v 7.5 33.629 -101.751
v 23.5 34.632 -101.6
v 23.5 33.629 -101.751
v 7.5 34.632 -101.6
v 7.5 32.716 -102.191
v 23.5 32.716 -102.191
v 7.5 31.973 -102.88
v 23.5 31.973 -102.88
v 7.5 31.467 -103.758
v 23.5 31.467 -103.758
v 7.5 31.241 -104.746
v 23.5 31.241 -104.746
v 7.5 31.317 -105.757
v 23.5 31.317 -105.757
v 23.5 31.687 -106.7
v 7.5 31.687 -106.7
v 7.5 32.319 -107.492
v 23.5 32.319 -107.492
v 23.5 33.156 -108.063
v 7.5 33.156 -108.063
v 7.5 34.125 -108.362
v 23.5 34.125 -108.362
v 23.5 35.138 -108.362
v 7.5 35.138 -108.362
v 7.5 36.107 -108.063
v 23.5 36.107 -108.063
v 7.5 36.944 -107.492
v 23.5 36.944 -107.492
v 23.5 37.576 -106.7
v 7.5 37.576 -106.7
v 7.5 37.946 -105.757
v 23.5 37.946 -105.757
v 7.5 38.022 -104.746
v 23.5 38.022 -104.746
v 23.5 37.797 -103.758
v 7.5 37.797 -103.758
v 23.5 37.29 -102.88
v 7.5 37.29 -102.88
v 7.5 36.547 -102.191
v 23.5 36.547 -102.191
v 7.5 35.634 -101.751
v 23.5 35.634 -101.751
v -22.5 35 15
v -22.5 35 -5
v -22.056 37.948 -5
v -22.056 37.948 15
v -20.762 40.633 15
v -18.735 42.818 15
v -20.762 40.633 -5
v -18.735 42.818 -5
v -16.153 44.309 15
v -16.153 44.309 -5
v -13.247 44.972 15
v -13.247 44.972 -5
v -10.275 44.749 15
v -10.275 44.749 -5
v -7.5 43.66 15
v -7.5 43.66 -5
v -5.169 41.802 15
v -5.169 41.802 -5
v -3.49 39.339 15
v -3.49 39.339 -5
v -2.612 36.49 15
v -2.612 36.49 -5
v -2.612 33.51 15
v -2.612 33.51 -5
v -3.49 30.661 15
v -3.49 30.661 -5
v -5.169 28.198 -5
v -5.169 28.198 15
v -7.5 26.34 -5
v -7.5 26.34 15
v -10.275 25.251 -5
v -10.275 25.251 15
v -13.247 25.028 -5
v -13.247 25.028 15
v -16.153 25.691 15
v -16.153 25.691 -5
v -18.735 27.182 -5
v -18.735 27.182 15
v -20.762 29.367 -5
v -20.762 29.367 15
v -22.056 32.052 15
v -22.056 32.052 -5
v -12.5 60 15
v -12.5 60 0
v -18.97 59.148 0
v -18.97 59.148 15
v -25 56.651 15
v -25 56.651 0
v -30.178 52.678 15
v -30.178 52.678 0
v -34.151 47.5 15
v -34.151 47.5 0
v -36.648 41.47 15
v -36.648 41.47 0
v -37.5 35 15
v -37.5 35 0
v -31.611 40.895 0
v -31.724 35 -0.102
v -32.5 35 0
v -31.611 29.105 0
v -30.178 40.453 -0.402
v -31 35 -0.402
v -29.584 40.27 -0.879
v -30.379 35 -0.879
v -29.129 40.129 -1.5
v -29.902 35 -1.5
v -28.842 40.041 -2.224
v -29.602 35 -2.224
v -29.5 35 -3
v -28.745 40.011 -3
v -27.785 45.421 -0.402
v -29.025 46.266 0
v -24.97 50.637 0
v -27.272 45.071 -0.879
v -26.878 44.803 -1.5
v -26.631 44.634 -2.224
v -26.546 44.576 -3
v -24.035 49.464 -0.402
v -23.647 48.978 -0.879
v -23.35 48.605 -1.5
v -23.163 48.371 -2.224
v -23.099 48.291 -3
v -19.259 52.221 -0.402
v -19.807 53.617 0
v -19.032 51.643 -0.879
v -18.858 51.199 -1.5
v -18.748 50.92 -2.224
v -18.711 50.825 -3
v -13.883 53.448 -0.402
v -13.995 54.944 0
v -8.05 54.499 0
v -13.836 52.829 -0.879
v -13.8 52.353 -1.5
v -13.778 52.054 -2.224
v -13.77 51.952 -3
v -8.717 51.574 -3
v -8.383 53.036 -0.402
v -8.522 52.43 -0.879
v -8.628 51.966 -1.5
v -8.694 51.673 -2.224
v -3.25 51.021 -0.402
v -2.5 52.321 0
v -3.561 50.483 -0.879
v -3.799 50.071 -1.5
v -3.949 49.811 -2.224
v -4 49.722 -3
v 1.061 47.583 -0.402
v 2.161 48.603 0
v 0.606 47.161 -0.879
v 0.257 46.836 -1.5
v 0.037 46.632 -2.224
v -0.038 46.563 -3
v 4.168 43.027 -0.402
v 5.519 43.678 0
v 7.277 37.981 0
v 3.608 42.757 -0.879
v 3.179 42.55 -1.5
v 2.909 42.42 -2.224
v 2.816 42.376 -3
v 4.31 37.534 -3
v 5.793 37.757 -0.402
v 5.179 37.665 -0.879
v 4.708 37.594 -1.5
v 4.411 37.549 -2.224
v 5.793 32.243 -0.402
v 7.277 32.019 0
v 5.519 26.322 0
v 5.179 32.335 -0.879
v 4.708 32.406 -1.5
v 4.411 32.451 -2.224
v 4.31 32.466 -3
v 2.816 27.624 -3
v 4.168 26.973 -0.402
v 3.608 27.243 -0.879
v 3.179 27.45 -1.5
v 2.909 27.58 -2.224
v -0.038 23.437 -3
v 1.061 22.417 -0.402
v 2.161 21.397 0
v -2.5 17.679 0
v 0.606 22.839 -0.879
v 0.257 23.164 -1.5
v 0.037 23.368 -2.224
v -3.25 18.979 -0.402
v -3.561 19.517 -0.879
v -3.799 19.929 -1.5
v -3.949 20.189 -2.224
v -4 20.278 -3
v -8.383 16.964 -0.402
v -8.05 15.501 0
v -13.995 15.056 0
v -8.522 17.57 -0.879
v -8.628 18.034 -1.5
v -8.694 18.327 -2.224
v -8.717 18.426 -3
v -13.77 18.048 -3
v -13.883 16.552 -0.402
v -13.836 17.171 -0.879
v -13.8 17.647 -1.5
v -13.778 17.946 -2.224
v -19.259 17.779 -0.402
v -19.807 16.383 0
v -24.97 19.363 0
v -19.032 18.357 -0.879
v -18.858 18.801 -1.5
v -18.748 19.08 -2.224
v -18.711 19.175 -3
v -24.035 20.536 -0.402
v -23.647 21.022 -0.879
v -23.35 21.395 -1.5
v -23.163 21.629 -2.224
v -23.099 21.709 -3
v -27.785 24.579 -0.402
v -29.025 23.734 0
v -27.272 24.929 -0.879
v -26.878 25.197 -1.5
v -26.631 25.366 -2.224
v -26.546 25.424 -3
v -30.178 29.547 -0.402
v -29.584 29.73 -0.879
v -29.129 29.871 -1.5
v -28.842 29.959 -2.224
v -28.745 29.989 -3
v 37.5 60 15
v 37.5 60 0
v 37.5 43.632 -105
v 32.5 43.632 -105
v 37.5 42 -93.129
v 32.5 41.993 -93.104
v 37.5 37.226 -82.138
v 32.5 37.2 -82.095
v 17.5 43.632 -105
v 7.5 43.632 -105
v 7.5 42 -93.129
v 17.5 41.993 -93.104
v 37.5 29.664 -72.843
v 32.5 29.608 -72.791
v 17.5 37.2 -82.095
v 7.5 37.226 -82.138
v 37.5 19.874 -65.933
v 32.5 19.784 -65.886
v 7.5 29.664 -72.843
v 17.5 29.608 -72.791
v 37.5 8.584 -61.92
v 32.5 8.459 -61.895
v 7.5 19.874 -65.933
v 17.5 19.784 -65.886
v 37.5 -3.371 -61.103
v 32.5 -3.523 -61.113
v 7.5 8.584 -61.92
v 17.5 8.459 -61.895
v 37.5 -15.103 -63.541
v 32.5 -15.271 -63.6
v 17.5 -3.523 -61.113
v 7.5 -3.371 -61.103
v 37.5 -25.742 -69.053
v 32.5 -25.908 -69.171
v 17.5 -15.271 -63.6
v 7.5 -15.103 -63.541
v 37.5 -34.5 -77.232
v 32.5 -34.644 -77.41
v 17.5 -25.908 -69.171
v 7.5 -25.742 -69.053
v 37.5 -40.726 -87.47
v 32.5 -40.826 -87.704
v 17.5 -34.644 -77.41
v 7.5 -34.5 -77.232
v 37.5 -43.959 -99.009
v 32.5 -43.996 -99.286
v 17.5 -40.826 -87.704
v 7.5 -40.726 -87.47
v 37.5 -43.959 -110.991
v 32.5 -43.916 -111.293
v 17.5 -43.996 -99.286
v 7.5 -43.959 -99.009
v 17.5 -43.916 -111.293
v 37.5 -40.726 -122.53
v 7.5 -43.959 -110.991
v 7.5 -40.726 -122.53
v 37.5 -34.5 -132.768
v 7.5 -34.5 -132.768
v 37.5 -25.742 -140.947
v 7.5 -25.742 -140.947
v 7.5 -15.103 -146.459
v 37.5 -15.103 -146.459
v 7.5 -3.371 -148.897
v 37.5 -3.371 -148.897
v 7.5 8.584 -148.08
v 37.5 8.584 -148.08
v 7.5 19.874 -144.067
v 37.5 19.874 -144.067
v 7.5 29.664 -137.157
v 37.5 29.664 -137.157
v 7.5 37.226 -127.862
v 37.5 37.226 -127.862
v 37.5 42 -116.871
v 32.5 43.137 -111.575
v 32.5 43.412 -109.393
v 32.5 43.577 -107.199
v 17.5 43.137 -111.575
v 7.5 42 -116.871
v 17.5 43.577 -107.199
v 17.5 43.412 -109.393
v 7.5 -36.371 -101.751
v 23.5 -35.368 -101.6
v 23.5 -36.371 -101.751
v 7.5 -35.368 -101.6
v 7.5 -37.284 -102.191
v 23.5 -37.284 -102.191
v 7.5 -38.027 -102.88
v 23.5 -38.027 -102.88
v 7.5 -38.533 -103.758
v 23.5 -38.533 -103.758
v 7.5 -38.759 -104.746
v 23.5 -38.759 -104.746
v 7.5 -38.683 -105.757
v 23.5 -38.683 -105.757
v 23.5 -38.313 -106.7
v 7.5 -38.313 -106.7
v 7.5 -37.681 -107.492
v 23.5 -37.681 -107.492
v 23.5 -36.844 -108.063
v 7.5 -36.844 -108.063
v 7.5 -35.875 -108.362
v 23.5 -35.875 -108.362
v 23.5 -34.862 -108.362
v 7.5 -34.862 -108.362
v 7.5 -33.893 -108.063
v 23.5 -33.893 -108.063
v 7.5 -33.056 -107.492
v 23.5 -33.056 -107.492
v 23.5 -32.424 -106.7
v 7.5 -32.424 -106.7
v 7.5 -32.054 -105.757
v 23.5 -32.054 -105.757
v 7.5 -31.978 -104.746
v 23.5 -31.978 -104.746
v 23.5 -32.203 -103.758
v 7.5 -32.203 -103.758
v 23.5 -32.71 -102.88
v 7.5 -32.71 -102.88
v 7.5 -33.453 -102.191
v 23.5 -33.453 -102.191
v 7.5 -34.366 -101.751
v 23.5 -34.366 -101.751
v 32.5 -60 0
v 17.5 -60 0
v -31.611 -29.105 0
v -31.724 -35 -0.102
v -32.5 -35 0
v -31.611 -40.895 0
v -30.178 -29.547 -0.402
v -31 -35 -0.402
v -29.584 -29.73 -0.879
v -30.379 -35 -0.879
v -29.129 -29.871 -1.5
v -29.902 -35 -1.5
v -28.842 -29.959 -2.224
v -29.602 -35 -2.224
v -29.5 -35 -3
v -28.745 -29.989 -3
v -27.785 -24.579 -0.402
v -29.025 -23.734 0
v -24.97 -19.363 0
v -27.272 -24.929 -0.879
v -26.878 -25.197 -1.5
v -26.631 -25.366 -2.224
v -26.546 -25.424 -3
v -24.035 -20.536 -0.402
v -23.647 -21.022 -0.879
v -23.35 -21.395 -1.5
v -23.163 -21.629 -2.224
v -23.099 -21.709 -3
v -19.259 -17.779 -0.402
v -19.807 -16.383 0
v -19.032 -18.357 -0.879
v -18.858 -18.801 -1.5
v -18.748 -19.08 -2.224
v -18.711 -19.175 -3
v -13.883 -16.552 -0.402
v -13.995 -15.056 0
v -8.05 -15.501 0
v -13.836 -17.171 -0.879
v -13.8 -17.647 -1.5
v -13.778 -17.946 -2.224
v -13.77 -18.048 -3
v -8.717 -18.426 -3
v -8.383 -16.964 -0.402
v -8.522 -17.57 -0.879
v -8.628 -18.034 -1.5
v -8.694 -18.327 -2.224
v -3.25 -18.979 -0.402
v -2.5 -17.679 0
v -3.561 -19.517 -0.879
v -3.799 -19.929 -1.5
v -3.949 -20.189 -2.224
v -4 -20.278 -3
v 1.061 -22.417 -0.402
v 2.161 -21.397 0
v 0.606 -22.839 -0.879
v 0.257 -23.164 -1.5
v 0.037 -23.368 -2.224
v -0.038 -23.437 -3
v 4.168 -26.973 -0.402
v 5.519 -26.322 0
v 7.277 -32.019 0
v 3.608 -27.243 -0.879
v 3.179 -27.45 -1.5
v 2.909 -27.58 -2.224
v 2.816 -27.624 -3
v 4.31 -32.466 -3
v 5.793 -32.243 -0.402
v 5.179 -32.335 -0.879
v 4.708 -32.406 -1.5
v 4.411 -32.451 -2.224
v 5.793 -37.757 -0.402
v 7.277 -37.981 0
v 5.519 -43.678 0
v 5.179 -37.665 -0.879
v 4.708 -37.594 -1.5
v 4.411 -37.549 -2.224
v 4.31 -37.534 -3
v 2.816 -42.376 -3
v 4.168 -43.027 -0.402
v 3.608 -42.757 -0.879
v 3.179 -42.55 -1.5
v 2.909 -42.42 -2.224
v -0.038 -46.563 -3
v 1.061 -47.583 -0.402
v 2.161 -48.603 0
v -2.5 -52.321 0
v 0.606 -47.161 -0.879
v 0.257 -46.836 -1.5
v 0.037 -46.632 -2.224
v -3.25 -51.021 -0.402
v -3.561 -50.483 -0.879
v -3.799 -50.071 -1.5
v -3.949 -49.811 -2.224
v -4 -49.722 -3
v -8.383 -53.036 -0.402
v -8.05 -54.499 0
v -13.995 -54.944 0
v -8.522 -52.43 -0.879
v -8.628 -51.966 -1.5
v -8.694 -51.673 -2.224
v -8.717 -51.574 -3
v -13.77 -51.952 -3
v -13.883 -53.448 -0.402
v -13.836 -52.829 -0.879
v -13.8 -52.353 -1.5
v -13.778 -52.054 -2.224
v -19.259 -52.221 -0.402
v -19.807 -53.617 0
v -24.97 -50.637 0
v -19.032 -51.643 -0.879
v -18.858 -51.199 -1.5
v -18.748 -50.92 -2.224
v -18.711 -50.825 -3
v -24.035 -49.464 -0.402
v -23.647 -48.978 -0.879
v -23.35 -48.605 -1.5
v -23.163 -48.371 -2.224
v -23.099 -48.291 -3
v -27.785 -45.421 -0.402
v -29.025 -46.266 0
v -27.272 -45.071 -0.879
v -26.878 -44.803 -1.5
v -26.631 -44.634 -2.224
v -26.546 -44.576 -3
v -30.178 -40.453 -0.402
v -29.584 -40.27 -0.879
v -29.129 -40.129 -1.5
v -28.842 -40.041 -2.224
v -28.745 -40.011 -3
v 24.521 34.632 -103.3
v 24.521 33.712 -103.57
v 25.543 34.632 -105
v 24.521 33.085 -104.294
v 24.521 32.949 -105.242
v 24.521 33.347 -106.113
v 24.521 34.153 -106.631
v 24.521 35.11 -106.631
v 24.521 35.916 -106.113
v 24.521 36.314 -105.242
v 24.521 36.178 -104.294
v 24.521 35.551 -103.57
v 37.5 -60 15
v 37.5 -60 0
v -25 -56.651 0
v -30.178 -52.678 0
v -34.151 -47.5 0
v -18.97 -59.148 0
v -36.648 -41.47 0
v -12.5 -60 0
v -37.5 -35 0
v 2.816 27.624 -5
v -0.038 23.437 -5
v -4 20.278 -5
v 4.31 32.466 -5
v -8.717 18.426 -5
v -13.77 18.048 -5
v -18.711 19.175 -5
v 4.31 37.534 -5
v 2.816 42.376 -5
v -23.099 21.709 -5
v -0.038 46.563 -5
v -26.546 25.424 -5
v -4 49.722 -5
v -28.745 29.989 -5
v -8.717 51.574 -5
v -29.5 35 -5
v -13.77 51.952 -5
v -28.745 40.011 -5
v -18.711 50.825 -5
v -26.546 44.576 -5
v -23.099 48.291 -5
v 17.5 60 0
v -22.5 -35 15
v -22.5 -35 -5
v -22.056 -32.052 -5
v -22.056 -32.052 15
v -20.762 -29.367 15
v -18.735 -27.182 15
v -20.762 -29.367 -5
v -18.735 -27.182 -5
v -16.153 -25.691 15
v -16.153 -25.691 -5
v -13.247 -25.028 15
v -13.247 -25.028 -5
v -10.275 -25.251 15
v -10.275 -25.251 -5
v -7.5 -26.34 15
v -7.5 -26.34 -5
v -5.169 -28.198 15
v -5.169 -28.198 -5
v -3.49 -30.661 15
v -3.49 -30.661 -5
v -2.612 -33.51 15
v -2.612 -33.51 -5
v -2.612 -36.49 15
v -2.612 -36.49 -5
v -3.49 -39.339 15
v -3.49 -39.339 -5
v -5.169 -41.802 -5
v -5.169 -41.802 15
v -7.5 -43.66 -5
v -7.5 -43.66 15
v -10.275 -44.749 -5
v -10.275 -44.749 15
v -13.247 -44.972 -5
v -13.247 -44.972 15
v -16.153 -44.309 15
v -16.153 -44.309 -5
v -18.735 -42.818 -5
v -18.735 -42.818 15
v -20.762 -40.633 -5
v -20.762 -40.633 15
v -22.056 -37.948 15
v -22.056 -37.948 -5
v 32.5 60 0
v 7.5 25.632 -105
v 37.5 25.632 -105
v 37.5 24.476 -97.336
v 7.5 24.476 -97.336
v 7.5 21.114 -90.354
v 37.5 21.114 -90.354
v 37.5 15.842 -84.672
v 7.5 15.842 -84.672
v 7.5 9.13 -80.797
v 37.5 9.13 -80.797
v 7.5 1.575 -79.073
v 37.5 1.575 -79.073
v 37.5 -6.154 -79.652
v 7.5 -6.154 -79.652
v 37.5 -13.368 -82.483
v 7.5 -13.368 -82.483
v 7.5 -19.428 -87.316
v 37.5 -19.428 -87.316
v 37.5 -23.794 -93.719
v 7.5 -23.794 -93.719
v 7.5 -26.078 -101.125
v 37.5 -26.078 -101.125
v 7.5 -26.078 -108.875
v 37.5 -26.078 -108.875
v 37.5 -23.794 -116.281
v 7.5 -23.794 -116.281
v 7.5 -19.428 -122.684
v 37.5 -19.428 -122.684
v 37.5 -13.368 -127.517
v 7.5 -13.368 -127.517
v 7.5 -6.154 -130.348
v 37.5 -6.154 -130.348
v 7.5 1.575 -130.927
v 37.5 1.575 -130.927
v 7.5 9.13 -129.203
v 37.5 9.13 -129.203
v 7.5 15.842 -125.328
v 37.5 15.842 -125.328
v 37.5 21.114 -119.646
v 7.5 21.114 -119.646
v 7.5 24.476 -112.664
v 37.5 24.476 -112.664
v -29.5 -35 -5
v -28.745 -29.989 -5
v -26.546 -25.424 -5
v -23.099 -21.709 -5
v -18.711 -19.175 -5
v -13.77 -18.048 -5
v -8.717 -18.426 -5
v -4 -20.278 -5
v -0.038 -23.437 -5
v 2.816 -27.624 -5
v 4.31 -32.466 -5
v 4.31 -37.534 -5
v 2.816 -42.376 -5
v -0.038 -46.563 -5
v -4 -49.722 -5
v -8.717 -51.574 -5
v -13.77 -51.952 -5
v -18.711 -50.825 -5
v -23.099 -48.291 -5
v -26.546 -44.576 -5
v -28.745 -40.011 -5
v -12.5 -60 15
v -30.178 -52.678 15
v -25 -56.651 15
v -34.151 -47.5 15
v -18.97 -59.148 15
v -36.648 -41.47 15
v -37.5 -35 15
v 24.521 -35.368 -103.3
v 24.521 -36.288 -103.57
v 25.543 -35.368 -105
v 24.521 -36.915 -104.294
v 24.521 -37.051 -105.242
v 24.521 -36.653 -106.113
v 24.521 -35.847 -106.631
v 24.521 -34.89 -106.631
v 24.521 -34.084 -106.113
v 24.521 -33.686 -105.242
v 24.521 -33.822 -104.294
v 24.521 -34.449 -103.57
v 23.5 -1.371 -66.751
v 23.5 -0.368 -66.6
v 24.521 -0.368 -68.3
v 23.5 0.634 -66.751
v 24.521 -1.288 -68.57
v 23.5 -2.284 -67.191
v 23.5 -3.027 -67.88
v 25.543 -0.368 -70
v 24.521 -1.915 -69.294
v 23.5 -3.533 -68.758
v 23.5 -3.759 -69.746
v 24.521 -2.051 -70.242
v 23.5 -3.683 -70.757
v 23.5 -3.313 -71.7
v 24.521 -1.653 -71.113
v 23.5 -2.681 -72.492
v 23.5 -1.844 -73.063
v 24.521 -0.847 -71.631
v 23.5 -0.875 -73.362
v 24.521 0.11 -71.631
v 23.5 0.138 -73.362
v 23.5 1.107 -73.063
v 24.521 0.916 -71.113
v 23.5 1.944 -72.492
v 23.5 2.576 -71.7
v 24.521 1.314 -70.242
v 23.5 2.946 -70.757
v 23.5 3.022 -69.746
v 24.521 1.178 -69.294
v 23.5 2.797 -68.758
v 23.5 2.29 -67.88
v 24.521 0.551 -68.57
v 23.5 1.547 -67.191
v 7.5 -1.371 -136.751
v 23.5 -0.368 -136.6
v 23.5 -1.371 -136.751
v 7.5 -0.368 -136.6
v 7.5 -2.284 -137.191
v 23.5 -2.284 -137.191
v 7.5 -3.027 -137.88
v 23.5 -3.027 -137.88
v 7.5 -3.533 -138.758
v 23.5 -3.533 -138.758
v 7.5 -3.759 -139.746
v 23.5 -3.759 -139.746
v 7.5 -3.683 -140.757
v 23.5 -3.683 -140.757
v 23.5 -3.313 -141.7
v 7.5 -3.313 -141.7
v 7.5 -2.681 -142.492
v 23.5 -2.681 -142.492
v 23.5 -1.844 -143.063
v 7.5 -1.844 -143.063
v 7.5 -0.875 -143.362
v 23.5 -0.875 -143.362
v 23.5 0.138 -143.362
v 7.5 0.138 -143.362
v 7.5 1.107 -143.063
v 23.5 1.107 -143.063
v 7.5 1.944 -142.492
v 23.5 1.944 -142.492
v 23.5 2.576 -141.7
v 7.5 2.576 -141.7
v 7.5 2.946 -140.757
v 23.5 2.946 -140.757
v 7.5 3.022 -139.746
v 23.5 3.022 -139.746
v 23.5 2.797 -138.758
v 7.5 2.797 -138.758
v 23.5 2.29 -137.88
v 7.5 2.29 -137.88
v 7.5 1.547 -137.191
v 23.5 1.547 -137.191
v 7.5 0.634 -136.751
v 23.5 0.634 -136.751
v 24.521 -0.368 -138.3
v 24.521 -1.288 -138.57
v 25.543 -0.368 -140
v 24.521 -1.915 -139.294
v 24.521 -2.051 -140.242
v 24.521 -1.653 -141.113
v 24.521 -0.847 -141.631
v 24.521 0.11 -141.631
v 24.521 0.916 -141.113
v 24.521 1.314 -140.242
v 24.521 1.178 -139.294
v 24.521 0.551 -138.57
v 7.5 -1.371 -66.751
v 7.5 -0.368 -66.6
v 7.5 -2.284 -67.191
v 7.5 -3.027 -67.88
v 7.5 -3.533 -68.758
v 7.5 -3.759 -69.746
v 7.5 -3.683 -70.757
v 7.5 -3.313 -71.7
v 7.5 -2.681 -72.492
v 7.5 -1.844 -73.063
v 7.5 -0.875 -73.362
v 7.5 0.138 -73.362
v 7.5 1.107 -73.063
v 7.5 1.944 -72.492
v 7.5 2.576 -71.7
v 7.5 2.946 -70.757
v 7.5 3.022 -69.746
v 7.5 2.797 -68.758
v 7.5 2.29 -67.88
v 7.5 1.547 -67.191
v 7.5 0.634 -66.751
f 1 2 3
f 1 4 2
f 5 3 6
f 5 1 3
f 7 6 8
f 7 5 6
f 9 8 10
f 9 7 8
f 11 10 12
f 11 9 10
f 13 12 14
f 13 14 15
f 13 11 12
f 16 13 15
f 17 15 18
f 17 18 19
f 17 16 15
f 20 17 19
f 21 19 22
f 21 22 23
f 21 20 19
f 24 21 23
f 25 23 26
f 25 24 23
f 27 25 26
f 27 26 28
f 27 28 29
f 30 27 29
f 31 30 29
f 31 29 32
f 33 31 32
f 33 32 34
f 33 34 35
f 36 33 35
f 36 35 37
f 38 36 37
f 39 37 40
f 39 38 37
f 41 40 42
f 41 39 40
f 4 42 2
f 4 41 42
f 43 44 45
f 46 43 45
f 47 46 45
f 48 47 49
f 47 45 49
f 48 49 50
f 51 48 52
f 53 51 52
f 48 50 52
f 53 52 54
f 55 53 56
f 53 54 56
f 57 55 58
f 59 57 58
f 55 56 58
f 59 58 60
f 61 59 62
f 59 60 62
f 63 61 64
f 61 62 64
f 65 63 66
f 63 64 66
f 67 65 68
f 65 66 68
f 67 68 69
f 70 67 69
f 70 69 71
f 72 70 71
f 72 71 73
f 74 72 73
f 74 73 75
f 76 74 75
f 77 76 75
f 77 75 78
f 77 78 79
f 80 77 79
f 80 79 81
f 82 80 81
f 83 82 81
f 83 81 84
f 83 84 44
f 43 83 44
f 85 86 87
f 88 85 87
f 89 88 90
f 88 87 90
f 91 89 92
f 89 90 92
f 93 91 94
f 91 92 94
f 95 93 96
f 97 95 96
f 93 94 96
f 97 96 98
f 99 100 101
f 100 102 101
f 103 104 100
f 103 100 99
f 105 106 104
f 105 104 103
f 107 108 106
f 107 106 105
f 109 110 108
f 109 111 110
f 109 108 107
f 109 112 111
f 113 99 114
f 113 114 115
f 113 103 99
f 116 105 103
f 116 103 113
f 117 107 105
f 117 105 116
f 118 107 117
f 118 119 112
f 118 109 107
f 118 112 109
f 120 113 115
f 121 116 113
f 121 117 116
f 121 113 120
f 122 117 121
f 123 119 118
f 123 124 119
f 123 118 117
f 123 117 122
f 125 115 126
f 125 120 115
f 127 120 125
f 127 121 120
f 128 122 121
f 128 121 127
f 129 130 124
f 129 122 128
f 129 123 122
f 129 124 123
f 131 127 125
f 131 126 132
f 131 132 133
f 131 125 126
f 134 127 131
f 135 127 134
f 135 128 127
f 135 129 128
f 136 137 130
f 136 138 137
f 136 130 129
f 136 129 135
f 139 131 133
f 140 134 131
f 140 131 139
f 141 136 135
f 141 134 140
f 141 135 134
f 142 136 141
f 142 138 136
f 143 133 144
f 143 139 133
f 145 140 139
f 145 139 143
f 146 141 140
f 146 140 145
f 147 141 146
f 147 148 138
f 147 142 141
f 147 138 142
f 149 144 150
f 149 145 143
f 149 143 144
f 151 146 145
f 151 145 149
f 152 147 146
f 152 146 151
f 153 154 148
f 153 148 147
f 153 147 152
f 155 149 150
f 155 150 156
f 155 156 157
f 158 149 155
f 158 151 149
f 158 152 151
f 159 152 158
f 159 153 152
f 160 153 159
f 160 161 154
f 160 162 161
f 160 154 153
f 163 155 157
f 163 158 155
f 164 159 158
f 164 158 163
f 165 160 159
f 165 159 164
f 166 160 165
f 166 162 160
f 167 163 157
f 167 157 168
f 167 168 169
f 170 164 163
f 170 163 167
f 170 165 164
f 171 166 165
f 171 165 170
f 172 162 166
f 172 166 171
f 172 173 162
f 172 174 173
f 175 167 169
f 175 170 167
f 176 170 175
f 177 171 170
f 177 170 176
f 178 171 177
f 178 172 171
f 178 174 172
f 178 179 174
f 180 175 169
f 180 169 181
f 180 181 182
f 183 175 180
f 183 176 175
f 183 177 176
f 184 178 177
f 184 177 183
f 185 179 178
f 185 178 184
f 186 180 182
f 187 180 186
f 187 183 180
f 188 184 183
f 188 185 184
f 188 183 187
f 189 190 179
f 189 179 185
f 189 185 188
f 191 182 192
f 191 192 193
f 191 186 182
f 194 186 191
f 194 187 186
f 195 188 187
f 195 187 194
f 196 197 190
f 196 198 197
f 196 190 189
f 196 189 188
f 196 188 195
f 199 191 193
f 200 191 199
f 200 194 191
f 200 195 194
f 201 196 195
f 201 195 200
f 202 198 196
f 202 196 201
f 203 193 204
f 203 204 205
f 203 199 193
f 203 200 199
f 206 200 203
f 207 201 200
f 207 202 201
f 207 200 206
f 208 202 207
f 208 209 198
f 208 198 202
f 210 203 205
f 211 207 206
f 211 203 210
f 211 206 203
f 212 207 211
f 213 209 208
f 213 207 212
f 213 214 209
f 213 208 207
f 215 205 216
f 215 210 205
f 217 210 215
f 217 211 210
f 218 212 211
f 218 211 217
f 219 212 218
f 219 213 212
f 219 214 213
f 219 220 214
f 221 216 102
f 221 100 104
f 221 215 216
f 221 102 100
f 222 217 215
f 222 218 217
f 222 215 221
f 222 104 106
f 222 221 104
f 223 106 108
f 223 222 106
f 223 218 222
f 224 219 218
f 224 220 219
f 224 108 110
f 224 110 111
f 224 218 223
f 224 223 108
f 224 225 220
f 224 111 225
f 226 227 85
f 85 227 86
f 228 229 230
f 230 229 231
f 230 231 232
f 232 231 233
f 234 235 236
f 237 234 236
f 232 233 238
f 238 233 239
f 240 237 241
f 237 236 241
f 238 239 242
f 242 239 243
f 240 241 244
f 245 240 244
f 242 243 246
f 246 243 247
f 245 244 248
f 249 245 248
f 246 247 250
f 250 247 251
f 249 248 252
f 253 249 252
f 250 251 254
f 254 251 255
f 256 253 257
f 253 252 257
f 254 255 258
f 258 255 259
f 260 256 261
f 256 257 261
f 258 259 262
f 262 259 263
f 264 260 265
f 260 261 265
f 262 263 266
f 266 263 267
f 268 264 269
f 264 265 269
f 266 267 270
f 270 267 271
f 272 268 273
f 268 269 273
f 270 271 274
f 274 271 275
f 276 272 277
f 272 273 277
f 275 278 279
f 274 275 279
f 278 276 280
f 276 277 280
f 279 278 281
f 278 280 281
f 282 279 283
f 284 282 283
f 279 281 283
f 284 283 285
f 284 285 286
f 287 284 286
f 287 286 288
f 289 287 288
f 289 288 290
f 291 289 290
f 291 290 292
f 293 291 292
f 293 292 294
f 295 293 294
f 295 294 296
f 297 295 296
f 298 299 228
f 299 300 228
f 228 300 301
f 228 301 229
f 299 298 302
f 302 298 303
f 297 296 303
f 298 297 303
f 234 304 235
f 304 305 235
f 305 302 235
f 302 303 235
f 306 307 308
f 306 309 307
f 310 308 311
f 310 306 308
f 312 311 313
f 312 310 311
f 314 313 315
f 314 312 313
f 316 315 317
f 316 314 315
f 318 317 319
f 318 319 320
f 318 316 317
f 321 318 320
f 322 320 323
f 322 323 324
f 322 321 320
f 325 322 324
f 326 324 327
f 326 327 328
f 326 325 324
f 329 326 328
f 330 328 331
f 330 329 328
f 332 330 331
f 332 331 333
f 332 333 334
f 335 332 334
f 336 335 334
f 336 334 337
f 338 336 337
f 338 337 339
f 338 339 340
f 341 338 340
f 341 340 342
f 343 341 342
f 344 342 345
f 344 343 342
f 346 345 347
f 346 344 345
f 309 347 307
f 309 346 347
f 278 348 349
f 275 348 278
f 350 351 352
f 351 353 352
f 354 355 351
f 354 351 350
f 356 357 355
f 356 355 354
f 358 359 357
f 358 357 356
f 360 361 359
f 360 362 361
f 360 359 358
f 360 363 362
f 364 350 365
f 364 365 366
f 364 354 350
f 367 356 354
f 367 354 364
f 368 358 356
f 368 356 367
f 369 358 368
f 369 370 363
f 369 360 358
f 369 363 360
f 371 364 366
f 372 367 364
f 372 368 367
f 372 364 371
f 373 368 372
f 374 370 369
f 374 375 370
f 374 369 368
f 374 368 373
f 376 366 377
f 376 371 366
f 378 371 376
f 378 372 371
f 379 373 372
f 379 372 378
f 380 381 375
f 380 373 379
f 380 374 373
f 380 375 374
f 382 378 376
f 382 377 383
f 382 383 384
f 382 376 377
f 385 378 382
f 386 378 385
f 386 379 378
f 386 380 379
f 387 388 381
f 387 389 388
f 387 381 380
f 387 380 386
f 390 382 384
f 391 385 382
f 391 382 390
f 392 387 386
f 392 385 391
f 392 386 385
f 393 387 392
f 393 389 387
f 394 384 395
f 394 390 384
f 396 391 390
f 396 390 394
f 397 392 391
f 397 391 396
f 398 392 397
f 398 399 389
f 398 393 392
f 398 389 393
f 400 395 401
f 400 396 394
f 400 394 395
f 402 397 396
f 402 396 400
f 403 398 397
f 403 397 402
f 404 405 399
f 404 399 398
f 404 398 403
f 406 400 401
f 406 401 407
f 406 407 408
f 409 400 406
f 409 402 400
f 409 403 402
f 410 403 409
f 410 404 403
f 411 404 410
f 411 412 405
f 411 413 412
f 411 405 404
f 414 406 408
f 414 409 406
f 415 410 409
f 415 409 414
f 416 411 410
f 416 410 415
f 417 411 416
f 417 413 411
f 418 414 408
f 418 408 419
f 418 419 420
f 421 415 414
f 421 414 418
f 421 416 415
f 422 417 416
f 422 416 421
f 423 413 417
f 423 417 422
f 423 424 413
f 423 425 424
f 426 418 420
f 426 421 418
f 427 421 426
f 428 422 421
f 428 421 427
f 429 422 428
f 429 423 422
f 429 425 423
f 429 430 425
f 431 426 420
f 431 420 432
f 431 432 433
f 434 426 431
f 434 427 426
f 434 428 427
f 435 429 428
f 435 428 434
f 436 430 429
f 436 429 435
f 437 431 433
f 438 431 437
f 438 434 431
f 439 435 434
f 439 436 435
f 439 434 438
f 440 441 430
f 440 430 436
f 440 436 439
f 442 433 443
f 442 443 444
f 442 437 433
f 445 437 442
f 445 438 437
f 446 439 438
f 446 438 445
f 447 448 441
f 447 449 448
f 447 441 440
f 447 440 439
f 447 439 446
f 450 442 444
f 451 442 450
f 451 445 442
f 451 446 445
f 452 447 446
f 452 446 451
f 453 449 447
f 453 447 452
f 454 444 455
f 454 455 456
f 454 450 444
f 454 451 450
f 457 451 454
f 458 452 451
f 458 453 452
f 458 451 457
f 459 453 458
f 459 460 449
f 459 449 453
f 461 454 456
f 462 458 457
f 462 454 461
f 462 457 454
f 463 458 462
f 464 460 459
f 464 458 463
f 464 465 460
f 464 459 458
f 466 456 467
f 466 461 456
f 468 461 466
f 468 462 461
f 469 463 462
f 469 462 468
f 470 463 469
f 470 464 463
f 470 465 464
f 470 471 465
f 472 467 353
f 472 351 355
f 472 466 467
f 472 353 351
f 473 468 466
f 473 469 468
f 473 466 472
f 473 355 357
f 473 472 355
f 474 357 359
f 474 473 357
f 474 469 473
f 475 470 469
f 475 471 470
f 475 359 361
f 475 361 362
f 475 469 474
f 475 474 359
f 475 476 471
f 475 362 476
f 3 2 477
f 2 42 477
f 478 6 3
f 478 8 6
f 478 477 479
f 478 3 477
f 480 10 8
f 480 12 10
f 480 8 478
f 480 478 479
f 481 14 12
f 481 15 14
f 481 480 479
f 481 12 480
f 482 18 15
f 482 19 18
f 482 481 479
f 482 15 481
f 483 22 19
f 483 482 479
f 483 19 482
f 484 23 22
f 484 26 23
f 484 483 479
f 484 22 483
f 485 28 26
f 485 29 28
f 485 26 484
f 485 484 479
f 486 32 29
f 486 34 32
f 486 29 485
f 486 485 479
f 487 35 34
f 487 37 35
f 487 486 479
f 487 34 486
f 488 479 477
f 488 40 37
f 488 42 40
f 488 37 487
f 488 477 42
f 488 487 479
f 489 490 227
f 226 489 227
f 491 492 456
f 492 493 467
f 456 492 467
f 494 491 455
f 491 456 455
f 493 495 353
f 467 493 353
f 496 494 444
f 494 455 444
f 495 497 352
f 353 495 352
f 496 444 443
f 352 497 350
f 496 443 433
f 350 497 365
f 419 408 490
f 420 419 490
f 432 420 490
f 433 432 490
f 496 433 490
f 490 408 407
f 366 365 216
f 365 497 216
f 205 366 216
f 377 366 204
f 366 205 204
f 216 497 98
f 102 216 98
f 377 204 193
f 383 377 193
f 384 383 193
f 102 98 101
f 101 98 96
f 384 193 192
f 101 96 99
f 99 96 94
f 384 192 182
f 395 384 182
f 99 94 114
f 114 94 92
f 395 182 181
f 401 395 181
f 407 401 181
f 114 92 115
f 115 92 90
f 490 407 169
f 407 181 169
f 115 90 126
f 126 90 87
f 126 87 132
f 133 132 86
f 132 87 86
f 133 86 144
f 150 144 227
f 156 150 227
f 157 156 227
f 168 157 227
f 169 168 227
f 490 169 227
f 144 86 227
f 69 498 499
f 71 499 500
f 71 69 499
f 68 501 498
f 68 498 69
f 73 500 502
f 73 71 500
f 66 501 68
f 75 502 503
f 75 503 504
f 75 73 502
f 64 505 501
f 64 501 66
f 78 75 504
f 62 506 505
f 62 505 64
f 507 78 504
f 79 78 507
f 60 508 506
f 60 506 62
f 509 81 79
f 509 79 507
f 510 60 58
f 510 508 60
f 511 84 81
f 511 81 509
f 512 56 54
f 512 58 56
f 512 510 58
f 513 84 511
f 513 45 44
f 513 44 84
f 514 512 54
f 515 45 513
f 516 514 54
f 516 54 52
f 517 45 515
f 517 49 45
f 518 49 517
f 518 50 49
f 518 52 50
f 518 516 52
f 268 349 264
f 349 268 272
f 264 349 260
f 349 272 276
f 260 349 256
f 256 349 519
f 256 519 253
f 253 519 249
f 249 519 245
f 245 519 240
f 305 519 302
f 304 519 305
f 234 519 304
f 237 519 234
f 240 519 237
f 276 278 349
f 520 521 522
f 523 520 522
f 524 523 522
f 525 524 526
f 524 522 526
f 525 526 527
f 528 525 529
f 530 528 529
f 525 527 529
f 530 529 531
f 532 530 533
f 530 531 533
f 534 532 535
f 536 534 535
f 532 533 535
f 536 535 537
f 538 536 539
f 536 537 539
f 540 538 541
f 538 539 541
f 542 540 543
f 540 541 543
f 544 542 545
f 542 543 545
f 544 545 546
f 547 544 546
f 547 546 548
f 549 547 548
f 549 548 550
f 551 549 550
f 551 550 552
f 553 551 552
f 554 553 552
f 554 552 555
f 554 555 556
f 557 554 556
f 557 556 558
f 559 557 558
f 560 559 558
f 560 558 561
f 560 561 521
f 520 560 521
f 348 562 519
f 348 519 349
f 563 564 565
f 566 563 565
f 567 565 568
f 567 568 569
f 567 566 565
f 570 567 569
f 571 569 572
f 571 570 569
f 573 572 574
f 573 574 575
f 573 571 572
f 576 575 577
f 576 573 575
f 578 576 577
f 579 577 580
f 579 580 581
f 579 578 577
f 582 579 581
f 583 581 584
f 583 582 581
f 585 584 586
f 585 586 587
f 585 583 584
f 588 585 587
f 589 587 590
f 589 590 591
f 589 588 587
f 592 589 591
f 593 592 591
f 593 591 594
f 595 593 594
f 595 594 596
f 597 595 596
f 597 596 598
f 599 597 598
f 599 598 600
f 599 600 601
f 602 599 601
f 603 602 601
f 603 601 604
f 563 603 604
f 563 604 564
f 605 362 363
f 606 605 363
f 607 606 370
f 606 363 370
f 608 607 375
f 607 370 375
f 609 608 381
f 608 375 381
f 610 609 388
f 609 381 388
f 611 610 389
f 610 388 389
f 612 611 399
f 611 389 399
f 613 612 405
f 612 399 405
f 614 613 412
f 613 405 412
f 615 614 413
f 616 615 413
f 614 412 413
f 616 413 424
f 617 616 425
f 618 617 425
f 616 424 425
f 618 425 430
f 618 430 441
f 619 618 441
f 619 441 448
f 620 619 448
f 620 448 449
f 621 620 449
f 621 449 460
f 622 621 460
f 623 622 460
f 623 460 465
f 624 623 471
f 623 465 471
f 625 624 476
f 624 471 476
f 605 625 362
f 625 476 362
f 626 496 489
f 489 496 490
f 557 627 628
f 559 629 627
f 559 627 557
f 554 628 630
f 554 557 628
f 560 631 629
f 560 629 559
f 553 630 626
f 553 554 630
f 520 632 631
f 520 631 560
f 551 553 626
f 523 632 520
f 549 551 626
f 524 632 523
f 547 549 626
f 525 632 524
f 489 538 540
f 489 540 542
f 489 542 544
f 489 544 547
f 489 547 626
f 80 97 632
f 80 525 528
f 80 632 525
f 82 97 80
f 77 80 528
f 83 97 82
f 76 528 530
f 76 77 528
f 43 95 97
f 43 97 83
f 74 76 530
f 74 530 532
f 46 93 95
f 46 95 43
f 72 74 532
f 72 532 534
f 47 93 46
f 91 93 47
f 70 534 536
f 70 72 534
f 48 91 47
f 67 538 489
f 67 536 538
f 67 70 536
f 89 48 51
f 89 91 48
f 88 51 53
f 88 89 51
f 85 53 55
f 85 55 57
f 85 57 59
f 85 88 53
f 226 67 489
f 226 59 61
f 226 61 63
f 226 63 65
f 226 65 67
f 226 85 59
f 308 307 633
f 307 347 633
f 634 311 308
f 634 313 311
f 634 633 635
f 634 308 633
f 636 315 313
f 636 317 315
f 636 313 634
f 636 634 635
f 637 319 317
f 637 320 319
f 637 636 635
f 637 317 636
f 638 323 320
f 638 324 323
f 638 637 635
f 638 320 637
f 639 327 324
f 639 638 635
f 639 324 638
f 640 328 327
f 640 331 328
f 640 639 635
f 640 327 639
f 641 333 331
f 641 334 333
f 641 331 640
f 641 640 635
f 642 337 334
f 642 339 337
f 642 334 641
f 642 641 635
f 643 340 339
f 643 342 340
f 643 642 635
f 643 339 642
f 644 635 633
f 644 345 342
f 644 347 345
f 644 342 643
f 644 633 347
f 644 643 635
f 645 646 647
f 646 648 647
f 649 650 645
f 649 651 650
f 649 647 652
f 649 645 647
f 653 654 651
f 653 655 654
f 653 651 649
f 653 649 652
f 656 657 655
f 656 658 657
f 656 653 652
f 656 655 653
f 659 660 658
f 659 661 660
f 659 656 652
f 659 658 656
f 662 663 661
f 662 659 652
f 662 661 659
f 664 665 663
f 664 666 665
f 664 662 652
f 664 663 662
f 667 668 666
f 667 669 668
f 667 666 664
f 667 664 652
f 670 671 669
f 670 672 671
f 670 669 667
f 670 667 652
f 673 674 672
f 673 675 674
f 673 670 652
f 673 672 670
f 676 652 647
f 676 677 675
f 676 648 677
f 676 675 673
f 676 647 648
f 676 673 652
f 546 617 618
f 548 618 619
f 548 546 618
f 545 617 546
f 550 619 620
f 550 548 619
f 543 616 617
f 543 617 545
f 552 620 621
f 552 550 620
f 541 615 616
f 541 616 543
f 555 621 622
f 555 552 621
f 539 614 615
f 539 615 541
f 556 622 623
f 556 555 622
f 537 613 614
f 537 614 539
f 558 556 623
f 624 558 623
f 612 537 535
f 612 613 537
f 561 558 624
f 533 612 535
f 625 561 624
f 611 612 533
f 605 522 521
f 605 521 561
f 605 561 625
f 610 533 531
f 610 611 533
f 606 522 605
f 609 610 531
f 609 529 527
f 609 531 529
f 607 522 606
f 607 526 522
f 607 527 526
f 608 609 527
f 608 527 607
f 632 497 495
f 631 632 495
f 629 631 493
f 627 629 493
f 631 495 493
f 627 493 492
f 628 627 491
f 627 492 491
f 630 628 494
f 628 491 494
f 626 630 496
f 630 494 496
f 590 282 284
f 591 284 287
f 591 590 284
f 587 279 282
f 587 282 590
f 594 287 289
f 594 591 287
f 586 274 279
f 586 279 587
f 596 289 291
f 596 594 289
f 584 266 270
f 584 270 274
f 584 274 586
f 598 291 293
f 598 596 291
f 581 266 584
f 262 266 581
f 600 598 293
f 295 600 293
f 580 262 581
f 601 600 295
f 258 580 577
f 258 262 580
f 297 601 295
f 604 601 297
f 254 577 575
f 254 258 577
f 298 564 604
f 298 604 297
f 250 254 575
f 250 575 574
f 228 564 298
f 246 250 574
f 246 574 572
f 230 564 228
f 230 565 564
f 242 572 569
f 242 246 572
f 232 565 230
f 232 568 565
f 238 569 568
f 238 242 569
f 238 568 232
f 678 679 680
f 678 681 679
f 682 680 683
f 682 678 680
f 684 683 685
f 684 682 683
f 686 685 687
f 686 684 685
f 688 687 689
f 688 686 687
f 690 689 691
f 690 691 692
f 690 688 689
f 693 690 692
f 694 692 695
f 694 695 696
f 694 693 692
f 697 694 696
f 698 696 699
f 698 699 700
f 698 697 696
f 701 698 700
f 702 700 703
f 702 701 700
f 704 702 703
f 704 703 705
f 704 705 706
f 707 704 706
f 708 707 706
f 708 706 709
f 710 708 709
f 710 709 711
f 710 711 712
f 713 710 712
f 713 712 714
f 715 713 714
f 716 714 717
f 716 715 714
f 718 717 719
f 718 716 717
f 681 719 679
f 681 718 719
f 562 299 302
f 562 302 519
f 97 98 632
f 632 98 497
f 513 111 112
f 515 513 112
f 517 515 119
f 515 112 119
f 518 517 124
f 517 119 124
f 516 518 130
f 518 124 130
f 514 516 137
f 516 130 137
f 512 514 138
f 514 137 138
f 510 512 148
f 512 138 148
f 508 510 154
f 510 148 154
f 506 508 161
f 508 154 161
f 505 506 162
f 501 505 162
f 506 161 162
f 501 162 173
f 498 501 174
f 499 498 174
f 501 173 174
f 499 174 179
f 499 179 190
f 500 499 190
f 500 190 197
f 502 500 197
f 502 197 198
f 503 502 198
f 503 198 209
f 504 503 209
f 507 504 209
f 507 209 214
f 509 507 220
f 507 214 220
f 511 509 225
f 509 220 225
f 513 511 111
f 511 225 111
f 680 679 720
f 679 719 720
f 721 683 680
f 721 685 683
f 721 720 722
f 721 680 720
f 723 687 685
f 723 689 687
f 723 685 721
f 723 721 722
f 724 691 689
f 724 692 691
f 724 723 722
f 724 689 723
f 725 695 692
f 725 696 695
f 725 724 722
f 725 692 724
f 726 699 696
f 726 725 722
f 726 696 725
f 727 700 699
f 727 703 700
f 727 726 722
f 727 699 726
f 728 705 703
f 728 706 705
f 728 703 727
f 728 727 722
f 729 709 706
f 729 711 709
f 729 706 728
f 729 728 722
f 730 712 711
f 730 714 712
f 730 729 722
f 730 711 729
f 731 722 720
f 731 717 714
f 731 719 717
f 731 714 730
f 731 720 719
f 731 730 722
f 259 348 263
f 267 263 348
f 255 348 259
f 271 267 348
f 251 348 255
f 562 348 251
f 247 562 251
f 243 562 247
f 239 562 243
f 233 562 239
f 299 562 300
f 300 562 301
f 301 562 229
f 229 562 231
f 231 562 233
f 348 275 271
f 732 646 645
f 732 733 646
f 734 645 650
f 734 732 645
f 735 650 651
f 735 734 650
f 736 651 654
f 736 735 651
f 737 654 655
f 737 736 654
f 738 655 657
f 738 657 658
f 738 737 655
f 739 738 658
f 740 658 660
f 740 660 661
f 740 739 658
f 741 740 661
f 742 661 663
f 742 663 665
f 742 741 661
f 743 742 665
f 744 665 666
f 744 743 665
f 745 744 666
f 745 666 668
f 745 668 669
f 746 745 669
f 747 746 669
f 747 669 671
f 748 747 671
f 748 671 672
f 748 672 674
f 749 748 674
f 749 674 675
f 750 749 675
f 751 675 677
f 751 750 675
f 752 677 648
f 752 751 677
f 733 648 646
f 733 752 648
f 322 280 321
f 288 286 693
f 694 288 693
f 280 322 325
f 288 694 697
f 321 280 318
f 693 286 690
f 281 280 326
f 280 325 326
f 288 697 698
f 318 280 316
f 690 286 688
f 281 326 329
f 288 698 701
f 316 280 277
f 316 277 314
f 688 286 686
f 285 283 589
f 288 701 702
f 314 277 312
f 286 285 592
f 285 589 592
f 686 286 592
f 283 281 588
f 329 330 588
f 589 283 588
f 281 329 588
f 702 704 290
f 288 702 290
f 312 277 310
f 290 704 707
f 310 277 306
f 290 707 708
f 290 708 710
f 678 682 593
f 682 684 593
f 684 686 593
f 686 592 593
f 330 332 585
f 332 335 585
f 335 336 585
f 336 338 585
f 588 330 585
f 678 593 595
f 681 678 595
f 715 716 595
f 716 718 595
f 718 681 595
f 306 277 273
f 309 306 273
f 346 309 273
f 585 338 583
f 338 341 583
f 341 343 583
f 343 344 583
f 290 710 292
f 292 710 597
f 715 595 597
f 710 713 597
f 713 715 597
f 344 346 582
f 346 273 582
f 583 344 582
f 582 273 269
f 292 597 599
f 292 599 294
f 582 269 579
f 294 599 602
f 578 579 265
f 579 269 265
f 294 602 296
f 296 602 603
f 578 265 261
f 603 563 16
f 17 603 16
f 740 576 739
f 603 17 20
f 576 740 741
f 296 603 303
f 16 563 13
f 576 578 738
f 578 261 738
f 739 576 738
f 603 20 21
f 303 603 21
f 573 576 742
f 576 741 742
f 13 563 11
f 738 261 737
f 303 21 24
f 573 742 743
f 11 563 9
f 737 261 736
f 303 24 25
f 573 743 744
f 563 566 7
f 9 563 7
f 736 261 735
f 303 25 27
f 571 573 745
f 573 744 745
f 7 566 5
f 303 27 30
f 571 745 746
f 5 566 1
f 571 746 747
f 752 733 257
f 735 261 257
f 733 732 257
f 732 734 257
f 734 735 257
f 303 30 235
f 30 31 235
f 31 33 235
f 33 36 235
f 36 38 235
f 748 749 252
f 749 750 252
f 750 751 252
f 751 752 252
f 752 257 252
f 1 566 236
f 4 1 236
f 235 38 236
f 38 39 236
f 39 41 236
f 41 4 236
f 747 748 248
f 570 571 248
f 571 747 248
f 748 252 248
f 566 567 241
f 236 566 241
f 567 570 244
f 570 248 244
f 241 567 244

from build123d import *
from build123d.topology import SkipClean

# Parameters (mm, degrees)
BOSS_EXTRUDE1_DEPTH              = 15
BOSS_EXTRUDE2_START              = -5
SKETCH2_R                        = 26
BOSS_EXTRUDE2_DEPTH              = 15
BOSS_EXTRUDE4_DEPTH              = 5
BOSS_EXTRUDE4_DEPTH_BACK         = 25
SKETCH3_R                        = 44
SKETCH3_R_2                      = 26
TAP_DRILL_FOR_M8_TAP1_AT_2_COUNT = 2
TAP_DRILL_FOR_M8_TAP1_AT_2_PITCH = 49.497474683
TAP_DRILL_FOR_M8_TAP1_AT_3_COUNT = 2
TAP_DRILL_FOR_M8_TAP1_AT_3_PITCH = 70
TAP_DRILL_FOR_M8_TAP1_AT_4_COUNT = 2
TAP_DRILL_FOR_M8_TAP1_AT_4_PITCH = 49.497474683
SKETCH9_R                        = 17
BOSS_EXTRUDE6_DEPTH              = 5
SKETCH10_R                       = 10
CUT_EXTRUDE1_DEPTH               = 161.443915435
FILLET2_R                        = 3


with BuildPart() as part:
    # Sketch1 → Boss-Extrude1 (new body)
    with BuildSketch(Plane.XY):
        with BuildLine():
            Line((37.5, 60), (-12.5, 60))
            ThreePointArc((-12.5, 60), (-30.17766953, 52.67766953), (-37.5, 35))
            Line((-37.5, 35), (-37.5, -35))
            ThreePointArc((-37.5, -35), (-30.17766953, -52.67766953), (-12.5, -60))
            Line((-12.5, -60), (37.5, -60))
            Line((37.5, -60), (37.5, 60))
        make_face()
    extrude(amount=BOSS_EXTRUDE1_DEPTH)

    # Sketch9 → Boss-Extrude6 (add)
    with BuildSketch(Plane(origin=(0, 0, 0), x_dir=(-1, 0, 0), z_dir=(0, 0, -1))):
        with Locations((12.5, 35)):
            Circle(SKETCH9_R)
        with Locations((12.5, -35)):
            Circle(SKETCH9_R)
    extrude(amount=BOSS_EXTRUDE6_DEPTH)

    # Sketch10 → Cut-Extrude1 (cut, through all)
    with BuildSketch(Plane(origin=(0, 0, -5), x_dir=(-1, 0, 0), z_dir=(0, 0, -1))):
        with Locations((12.5, 35)):
            Circle(SKETCH10_R)
        with Locations((12.5, -35)):
            Circle(SKETCH10_R)
    extrude(amount=-CUT_EXTRUDE1_DEPTH, mode=Mode.SUBTRACT)

    # Fillet2
    fillet2_edges = [part.edges().sort_by_distance(p)[0] for p in [
        (4.5, 35, 0),
        (4.5, -35, 0),
    ]]
    fillet(fillet2_edges, radius=FILLET2_R)


with BuildPart() as body_2:
    # Sketch2 → Boss-Extrude2 (new body)
    with BuildSketch(Plane(origin=(37.5, 0, 0), x_dir=(0, 0, -1), z_dir=(1, 0, 0)).offset(BOSS_EXTRUDE2_START)):
        with BuildLine():
            Line((111.575118355, 43.137488486), (0, 60))
            Line((0, 60), (0, -60))
            Line((0, -60), (111.293427104, -43.916055117))
            ThreePointArc((111.293427104, -43.916055117), (148.999769647, -0.510839215), (111.575118355, 43.137488486))
        make_face()
        with Locations((105, -0.368463045)):
            Circle(SKETCH2_R, mode=Mode.SUBTRACT)
    extrude(amount=-BOSS_EXTRUDE2_DEPTH)

    # Sketch3 → Boss-Extrude4 (add, two sides: drawn at the far end of the back side and taken through both)
    with SkipClean():  # the faces are left unmerged after this step: merging them gives an invalid solid
        with BuildSketch(Plane(origin=(32.5, 0, 0), x_dir=(0, 0, -1), z_dir=(1, 0, 0)).offset(-BOSS_EXTRUDE4_DEPTH_BACK)):
            with Locations((105, -0.368463045)):
                Circle(SKETCH3_R)
            with Locations((105, -0.368463045)):
                Circle(SKETCH3_R_2, mode=Mode.SUBTRACT)
        extrude(amount=BOSS_EXTRUDE4_DEPTH + BOSS_EXTRUDE4_DEPTH_BACK)

    # Sketch5 → Tap Drill for M8 Tap1 (revolve, cut)
    with SkipClean():  # the faces are left unmerged after this step: merging them gives an invalid solid
        with BuildSketch(Plane(origin=(7.5, -0.368463045, -140), x_dir=(0, 0, 1), z_dir=(0, 1, 0))):
            Polygon((0, 0), (0, 18.042926105), (3.4, 16), (3.4, 0), align=None)
        tap_drill_for_m8_tap1 = revolve(axis=Axis((1.15, -0.368463045, -140), (1, 0, 0)), mode=Mode.SUBTRACT)

    # Tap Drill for M8 Tap1 at 2: Tap Drill for M8 Tap1 ×2
    with SkipClean():  # the faces are left unmerged after this step: merging them gives an invalid solid
        with Locations(*[Vector(0, 0.7071067811865477, 0.7071067811865475) * (i * TAP_DRILL_FOR_M8_TAP1_AT_2_PITCH) for i in range(1, TAP_DRILL_FOR_M8_TAP1_AT_2_COUNT)]):
            add(tap_drill_for_m8_tap1, mode=Mode.SUBTRACT)

    # Tap Drill for M8 Tap1 at 3: Tap Drill for M8 Tap1 ×2
    with SkipClean():  # the faces are left unmerged after this step: merging them gives an invalid solid
        with Locations(*[(0, 0, i * TAP_DRILL_FOR_M8_TAP1_AT_3_PITCH) for i in range(1, TAP_DRILL_FOR_M8_TAP1_AT_3_COUNT)]):
            add(tap_drill_for_m8_tap1, mode=Mode.SUBTRACT)

    # Tap Drill for M8 Tap1 at 4: Tap Drill for M8 Tap1 ×2
    with SkipClean():  # the faces are left unmerged after this step: merging them gives an invalid solid
        with Locations(*[Vector(0, -0.7071067811865476, 0.7071067811865476) * (i * TAP_DRILL_FOR_M8_TAP1_AT_4_PITCH) for i in range(1, TAP_DRILL_FOR_M8_TAP1_AT_4_COUNT)]):
            add(tap_drill_for_m8_tap1, mode=Mode.SUBTRACT)


solid = Compound([part.part, body_2.part])
